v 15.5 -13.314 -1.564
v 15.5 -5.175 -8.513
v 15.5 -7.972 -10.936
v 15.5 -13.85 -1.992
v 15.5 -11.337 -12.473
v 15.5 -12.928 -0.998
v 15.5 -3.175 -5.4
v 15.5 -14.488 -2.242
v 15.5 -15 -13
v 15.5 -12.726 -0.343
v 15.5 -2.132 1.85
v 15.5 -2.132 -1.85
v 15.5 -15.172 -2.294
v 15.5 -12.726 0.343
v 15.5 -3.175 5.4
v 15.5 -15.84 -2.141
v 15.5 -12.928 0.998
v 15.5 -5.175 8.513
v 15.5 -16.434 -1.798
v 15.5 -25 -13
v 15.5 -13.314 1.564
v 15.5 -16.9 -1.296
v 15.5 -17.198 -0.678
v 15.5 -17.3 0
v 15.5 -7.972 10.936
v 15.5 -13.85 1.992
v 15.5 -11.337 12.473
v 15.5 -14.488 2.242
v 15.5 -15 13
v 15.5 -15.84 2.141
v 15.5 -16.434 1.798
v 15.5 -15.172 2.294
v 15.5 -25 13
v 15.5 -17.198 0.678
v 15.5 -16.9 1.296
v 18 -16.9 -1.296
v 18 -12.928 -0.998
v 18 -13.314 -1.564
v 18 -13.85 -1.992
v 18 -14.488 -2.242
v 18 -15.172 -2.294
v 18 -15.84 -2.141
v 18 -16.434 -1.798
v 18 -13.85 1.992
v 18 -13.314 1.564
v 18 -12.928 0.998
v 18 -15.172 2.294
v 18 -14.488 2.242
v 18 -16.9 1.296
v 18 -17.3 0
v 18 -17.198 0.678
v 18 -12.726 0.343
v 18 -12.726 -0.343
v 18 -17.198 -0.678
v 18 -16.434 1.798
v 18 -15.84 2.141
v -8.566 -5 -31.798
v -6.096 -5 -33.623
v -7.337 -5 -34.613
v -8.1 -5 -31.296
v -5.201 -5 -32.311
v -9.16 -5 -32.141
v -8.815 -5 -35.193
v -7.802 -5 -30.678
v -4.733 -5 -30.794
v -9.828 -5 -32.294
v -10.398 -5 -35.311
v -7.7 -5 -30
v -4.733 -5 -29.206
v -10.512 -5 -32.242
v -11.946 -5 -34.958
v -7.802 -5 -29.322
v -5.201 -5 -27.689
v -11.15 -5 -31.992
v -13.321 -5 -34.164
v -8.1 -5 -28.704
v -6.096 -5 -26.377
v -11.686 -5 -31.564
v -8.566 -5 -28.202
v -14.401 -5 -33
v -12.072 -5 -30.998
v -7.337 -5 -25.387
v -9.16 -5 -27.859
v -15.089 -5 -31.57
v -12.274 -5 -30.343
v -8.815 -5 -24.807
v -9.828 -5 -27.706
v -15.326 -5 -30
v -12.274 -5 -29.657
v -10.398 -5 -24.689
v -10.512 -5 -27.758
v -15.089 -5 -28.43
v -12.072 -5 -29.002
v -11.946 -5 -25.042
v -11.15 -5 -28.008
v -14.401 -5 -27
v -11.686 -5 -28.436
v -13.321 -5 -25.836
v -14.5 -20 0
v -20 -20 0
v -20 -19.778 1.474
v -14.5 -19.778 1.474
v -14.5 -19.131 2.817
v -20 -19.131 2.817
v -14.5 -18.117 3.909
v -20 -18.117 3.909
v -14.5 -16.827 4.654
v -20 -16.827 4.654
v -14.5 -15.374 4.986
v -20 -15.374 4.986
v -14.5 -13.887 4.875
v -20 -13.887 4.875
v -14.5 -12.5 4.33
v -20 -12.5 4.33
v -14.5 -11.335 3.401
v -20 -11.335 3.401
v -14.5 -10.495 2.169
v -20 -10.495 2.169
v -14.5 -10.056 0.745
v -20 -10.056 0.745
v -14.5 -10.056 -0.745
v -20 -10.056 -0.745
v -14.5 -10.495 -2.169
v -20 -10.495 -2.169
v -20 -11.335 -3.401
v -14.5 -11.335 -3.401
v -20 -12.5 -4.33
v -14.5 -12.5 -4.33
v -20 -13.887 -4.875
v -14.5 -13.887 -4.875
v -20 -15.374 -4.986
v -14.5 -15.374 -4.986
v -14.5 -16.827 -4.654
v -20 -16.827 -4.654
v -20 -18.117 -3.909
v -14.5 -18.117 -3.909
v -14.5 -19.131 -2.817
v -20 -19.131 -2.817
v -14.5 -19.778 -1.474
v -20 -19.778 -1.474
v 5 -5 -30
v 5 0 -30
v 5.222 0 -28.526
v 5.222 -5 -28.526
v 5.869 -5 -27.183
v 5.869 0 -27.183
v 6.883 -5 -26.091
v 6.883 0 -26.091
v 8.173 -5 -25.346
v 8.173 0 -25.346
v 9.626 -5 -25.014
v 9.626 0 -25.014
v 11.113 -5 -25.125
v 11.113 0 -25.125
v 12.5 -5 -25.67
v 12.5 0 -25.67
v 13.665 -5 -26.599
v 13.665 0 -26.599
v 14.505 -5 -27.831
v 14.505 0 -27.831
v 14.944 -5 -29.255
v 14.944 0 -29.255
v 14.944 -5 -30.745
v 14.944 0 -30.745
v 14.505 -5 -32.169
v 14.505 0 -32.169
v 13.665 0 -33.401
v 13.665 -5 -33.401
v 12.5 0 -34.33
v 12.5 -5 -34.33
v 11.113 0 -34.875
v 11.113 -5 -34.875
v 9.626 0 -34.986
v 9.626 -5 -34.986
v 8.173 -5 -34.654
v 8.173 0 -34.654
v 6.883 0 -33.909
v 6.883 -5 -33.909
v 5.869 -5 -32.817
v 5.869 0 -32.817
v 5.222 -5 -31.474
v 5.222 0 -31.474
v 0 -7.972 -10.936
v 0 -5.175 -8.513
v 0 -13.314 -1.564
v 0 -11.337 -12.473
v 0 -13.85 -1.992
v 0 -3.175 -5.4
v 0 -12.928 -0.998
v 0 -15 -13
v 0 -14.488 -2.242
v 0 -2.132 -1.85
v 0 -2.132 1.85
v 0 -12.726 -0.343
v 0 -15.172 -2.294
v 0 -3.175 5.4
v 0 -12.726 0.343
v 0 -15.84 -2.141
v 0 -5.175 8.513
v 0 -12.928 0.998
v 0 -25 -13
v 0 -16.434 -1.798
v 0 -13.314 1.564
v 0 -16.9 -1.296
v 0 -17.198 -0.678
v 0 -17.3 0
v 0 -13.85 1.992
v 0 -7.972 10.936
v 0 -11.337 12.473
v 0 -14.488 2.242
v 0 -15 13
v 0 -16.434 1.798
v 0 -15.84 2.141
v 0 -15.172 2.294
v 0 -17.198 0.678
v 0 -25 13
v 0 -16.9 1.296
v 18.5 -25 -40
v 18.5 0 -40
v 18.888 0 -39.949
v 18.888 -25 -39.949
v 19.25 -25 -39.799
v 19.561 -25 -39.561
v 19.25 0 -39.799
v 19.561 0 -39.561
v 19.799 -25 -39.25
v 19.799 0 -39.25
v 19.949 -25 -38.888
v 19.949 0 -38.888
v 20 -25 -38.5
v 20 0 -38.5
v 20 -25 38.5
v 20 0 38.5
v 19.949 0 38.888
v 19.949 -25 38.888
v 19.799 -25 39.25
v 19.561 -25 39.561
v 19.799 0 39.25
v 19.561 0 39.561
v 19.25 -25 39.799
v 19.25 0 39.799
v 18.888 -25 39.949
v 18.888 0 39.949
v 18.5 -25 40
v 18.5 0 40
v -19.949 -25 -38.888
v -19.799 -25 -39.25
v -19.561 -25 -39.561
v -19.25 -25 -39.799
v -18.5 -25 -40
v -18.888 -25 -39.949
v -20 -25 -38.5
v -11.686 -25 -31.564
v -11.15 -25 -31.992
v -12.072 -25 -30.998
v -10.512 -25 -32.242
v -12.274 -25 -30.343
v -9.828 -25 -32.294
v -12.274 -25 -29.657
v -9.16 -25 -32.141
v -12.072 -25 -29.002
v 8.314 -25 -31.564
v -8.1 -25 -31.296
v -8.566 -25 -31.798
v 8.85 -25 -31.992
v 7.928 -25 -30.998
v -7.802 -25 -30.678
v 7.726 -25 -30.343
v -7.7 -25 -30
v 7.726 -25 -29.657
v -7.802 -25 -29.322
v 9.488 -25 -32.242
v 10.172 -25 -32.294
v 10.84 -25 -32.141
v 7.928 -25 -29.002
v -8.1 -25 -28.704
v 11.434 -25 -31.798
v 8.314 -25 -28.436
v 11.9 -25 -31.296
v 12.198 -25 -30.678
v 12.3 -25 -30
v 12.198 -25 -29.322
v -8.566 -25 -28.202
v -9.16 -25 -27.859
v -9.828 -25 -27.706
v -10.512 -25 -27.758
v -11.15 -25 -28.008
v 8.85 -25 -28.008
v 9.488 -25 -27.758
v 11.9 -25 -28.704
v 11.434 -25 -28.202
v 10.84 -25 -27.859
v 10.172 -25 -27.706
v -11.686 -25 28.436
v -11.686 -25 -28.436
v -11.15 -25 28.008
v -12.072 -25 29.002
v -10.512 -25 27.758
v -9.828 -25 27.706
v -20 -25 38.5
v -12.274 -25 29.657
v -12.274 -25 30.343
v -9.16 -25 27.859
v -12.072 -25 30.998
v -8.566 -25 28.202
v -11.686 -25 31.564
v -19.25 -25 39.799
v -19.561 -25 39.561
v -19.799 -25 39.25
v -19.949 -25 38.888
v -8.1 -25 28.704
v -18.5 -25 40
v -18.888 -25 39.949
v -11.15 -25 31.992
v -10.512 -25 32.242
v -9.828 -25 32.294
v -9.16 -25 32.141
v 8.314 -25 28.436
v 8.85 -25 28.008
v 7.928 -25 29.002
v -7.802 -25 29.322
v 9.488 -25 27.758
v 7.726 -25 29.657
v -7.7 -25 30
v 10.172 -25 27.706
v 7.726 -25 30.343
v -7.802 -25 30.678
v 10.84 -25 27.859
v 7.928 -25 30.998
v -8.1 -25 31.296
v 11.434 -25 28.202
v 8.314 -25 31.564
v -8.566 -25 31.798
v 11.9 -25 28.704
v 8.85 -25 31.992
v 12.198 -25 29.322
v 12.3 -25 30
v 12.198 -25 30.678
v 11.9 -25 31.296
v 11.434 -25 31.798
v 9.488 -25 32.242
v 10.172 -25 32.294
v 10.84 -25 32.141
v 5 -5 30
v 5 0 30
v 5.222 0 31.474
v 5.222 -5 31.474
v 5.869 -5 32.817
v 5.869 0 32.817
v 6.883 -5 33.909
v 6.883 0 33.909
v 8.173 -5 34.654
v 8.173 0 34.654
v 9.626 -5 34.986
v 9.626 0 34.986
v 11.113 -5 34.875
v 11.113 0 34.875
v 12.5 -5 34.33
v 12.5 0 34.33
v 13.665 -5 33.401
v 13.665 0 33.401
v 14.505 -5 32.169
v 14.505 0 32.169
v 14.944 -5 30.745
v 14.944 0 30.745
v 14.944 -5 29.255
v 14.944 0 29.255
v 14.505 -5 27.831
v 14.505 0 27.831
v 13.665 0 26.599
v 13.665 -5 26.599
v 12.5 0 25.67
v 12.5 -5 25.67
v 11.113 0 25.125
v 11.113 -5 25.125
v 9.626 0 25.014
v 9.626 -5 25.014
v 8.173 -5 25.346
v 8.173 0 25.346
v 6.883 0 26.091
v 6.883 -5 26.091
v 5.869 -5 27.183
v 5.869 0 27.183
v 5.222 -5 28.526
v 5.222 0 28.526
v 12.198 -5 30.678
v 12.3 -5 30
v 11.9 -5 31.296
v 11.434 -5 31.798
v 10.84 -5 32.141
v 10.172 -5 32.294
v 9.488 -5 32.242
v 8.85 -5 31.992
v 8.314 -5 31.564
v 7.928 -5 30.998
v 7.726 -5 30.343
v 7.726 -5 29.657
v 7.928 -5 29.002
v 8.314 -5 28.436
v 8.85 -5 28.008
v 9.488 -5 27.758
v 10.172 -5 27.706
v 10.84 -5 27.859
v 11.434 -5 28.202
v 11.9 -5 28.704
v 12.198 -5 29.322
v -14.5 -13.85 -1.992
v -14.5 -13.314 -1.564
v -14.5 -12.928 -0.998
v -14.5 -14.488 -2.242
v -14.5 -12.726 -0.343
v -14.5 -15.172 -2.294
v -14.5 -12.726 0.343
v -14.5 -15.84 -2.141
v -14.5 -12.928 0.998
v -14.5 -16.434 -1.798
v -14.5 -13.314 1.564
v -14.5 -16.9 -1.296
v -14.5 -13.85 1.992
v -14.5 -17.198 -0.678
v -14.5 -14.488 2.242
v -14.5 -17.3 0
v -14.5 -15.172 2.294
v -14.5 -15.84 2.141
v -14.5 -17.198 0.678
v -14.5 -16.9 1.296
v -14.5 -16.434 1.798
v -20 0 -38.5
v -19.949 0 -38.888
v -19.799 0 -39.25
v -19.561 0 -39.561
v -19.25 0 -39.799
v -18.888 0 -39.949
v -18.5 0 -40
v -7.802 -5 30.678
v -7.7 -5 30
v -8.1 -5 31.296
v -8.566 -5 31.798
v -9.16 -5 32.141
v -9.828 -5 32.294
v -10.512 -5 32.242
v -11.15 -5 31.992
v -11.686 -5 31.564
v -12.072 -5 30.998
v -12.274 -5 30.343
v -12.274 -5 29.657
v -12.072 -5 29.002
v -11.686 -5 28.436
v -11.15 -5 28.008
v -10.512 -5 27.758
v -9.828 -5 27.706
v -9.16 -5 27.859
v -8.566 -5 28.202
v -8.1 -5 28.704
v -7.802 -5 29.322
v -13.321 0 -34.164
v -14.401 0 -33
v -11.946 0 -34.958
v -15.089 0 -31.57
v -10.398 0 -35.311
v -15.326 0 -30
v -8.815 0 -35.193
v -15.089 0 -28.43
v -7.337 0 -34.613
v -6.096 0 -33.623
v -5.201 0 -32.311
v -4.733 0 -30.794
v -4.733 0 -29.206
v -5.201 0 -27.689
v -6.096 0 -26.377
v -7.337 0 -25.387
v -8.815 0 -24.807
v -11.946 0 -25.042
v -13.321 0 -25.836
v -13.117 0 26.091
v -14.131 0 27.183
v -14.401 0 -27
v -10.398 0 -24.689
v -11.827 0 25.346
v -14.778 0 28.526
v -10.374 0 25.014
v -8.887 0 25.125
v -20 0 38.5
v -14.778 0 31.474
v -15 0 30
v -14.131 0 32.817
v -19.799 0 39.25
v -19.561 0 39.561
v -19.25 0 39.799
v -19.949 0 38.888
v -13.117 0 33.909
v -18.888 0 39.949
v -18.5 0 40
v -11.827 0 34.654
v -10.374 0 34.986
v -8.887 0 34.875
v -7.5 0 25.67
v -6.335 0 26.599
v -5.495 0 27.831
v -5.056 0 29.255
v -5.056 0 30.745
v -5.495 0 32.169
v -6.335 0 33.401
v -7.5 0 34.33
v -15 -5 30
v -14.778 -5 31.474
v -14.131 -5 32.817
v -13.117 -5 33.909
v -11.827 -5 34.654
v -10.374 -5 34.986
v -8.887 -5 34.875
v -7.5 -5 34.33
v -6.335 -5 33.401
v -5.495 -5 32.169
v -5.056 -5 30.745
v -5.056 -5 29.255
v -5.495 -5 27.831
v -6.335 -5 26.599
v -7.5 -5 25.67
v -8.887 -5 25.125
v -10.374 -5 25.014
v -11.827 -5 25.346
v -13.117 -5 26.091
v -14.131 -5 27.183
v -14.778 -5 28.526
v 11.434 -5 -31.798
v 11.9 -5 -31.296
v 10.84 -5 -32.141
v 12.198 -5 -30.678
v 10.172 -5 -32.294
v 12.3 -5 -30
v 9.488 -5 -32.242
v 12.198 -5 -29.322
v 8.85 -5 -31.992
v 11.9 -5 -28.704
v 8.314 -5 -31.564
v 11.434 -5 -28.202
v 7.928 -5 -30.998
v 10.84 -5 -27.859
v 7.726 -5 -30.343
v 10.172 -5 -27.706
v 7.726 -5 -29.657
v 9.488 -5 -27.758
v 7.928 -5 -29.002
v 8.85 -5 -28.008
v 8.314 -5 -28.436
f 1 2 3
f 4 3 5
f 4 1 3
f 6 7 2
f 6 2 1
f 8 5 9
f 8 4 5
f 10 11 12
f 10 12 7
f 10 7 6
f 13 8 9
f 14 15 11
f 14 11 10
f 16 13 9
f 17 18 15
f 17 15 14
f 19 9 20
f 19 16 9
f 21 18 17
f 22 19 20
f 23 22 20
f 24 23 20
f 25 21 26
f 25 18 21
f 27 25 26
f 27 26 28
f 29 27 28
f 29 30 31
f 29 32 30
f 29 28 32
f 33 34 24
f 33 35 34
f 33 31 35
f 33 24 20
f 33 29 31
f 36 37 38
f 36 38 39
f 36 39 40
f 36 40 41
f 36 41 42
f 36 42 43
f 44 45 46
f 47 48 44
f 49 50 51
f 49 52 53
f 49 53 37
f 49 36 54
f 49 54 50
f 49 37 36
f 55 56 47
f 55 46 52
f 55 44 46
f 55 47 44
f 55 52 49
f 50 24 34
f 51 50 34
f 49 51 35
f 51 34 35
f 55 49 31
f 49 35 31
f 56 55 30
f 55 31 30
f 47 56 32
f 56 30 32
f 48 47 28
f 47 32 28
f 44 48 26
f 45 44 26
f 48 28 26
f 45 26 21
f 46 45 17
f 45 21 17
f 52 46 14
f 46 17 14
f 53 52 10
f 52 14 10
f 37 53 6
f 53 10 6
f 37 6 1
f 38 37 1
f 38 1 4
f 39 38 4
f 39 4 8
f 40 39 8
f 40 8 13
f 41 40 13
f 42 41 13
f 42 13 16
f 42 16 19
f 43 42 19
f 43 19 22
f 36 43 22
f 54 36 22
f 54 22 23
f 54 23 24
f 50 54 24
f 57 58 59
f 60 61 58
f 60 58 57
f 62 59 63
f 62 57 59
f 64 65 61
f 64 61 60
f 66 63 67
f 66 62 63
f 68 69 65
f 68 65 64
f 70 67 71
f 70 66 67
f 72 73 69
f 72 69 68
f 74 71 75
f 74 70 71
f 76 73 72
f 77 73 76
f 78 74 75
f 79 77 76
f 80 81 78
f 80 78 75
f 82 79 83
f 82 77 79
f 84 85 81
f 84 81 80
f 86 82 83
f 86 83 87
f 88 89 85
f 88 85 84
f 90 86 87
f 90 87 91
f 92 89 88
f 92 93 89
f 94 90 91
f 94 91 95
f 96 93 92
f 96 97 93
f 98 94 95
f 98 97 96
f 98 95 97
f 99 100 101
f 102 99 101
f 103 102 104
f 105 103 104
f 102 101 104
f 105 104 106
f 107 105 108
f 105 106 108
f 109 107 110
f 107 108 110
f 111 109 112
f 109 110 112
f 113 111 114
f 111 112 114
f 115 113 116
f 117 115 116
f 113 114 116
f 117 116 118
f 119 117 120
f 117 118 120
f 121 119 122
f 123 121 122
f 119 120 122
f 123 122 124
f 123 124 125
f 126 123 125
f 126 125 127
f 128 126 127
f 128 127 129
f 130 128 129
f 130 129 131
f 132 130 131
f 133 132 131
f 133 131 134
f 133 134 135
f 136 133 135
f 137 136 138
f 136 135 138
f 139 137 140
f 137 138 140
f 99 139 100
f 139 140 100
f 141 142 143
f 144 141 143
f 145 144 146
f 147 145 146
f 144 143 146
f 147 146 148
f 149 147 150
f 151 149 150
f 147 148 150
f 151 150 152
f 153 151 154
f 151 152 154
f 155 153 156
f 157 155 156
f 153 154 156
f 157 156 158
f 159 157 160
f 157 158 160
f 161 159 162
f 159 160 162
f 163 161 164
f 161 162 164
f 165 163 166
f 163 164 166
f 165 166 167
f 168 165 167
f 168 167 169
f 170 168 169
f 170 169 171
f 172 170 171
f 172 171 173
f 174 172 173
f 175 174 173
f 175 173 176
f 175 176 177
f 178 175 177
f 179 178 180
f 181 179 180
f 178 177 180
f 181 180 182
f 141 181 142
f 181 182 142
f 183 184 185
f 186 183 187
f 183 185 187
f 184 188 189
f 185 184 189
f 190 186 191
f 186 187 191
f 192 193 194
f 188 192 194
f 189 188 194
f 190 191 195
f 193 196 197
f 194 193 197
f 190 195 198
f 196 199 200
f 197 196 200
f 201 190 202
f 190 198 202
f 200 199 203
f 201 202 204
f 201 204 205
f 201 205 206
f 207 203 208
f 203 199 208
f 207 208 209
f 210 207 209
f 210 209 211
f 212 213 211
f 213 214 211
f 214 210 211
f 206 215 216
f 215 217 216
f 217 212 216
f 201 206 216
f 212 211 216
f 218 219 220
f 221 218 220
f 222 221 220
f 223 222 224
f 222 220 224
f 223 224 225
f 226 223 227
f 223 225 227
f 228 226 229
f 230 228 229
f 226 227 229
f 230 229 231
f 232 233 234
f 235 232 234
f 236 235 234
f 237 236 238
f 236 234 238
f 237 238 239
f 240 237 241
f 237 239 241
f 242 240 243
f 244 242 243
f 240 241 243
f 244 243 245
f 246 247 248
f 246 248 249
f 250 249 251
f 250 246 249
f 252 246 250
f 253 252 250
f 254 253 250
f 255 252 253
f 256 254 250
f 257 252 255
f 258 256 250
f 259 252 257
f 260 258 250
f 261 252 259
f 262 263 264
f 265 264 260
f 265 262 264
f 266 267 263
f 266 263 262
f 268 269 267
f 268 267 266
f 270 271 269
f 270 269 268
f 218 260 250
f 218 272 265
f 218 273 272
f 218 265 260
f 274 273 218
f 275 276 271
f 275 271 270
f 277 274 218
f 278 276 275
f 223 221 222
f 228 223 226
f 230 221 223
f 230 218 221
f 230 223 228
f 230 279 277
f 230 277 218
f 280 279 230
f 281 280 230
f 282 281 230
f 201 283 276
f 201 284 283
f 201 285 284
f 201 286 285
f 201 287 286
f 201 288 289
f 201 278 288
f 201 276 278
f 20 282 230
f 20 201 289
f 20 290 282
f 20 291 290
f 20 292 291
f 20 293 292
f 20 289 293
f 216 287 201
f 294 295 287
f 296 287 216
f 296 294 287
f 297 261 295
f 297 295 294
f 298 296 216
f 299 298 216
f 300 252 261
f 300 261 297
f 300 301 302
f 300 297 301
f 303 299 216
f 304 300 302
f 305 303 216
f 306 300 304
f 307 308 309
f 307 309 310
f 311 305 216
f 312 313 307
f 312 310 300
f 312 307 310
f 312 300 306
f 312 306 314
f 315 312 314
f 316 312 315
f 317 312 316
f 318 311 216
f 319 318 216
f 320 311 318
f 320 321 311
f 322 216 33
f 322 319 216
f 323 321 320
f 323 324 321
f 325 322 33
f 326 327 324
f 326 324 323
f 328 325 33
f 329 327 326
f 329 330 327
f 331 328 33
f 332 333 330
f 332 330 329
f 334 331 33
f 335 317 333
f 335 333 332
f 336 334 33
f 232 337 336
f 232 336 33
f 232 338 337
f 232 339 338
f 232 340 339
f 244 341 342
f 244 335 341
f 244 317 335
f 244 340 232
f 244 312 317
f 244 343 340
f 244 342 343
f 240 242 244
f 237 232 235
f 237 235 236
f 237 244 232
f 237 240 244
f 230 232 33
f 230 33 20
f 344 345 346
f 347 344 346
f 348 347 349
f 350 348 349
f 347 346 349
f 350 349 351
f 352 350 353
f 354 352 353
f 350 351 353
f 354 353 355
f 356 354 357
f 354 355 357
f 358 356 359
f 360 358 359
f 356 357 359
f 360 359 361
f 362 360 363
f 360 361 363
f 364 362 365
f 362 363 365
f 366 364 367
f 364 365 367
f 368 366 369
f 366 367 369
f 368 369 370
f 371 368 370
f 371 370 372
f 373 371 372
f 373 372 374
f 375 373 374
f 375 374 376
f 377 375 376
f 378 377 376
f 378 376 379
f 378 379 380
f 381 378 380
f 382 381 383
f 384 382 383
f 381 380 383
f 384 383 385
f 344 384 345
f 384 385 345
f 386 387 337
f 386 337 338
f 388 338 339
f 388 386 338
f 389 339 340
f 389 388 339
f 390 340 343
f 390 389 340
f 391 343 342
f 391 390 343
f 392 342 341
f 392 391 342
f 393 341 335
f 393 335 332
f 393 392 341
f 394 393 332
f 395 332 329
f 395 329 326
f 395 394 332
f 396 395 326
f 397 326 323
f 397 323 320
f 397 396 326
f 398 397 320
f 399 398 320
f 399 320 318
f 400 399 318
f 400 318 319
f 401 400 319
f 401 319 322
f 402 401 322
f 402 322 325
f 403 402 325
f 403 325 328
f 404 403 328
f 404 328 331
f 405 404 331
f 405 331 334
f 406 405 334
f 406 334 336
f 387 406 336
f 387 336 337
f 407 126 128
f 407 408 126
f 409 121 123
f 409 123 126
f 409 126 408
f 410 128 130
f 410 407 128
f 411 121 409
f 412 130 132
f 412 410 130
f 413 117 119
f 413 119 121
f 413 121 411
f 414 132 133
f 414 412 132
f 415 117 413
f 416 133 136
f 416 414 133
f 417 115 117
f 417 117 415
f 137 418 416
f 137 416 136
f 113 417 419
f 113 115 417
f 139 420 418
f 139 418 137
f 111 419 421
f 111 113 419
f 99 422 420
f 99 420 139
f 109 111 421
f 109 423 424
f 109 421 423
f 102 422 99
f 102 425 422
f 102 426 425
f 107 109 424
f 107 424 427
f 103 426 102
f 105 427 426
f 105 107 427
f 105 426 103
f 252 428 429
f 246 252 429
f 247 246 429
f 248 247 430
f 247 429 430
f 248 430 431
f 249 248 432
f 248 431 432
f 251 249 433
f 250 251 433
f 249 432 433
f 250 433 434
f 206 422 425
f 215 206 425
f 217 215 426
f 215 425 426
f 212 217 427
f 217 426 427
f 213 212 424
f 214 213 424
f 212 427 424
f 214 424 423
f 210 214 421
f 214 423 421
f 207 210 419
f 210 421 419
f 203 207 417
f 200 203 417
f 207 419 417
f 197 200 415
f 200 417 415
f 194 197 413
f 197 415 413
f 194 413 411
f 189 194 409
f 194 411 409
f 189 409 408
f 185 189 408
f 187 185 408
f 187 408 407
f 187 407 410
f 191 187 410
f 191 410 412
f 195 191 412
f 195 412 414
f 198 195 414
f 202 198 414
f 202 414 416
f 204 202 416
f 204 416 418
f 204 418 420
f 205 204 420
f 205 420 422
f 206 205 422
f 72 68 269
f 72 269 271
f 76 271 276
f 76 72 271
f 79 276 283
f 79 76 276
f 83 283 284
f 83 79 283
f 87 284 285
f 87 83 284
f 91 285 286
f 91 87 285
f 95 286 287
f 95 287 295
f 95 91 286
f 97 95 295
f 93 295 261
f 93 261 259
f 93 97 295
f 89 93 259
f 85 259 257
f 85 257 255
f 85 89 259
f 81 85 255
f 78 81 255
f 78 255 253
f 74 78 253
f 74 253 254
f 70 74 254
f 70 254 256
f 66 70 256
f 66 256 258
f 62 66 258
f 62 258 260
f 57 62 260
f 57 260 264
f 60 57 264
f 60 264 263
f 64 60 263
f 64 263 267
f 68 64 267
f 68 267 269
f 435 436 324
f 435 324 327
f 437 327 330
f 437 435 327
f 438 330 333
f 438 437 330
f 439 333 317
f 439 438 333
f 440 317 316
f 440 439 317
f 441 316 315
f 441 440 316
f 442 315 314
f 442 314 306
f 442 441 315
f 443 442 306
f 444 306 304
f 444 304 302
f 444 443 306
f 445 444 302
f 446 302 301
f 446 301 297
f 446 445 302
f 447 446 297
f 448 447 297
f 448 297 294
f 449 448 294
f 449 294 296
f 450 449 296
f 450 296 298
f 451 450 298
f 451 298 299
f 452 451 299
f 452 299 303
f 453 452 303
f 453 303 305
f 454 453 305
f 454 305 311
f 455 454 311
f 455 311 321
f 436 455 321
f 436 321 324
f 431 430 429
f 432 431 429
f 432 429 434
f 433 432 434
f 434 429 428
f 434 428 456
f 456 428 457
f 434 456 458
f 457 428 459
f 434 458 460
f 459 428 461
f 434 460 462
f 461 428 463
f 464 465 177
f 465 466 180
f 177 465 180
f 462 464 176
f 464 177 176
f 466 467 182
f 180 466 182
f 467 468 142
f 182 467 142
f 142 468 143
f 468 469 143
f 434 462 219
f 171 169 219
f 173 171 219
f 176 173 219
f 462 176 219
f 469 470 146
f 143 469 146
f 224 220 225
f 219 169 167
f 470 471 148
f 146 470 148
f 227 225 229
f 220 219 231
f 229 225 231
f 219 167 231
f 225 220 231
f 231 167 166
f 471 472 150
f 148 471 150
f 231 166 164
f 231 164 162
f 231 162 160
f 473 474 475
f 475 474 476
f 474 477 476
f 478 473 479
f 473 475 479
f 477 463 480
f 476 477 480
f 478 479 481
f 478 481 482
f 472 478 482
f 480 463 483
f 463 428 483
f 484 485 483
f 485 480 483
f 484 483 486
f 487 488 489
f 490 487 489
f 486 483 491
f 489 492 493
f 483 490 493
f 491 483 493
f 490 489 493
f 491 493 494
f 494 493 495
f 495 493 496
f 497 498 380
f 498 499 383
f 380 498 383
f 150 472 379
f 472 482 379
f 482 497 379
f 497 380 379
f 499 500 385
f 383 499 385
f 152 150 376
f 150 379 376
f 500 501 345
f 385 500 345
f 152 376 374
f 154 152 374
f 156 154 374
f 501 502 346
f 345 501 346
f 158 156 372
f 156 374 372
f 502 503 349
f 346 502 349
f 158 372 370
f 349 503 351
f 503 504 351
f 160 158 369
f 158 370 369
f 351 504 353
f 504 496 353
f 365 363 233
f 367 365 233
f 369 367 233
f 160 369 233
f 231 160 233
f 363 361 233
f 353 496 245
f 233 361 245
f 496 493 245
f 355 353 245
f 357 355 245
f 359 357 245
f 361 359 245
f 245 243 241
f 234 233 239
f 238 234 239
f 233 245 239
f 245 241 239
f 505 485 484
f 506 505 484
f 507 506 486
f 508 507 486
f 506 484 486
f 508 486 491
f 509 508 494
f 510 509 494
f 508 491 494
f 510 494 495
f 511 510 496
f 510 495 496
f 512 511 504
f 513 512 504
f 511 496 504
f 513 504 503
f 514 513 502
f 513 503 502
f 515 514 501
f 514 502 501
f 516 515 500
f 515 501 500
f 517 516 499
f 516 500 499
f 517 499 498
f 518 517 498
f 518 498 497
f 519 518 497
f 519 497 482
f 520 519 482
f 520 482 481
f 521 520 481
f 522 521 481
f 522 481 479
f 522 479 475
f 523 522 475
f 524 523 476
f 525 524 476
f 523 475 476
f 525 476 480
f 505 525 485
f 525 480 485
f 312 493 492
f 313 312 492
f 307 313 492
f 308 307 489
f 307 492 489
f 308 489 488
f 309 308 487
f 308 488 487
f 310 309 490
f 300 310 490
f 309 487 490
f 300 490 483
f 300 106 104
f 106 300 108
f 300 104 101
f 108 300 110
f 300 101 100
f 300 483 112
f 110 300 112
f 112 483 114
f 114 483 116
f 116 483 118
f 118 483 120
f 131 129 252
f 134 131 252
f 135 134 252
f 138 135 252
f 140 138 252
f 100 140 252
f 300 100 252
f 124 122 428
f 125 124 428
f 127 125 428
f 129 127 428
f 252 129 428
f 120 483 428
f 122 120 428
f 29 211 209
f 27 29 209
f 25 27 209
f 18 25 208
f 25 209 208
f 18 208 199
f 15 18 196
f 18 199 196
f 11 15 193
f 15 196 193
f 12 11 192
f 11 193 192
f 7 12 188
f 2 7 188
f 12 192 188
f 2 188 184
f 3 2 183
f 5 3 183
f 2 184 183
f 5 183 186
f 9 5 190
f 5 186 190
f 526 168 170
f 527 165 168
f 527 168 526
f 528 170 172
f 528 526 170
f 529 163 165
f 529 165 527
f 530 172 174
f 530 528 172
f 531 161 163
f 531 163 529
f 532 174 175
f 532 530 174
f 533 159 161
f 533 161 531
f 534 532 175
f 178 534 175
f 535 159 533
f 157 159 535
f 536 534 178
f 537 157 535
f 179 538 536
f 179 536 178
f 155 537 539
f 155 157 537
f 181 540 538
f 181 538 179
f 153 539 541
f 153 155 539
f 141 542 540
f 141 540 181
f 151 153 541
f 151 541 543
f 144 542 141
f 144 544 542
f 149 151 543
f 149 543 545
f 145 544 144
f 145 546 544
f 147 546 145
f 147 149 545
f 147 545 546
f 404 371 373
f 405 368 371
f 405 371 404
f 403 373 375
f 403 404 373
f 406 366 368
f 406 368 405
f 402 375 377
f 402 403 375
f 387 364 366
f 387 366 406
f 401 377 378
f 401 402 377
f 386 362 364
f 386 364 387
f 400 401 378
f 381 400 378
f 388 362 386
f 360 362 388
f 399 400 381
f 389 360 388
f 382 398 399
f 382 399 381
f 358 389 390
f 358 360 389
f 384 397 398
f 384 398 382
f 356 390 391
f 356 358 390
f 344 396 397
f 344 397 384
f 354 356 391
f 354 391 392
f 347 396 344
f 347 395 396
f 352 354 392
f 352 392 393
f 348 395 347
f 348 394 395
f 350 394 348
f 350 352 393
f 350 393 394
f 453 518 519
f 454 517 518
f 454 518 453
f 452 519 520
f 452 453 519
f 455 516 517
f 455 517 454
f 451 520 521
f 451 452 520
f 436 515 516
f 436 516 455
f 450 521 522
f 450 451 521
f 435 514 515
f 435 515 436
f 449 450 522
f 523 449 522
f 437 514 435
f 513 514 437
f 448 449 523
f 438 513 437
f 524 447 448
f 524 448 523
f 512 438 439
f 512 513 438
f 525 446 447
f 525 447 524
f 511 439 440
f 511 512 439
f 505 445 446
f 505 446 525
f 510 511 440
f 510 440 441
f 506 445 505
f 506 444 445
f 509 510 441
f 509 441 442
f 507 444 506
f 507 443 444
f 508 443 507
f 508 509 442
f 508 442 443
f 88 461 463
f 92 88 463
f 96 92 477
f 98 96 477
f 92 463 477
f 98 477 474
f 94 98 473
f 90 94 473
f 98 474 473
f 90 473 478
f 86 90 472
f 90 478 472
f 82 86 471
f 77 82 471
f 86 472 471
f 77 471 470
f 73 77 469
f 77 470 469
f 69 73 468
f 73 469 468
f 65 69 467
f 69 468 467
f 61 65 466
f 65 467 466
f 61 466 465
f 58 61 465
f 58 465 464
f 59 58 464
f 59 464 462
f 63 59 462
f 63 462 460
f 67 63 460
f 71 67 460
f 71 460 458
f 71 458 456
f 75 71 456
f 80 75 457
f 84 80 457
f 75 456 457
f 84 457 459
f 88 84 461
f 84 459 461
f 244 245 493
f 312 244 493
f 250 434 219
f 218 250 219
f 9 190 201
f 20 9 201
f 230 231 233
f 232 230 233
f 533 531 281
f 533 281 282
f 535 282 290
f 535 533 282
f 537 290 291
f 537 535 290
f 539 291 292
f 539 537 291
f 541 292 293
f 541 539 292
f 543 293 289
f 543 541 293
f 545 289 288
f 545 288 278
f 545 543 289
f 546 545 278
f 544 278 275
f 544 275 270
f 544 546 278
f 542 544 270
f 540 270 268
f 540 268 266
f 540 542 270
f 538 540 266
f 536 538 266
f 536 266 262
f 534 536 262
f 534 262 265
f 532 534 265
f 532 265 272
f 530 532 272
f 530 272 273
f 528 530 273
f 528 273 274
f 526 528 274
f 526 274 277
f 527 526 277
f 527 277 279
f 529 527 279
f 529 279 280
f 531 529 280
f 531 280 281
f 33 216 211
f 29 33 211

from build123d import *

# Parameters (mm, degrees)
F0_R      = 2.3
F1_DEPTH  = 25
F2_R      = 5
F2_R_2    = 5.3261161738
F3_DEPTH  = 5
F7_DEPTH  = 15.5
F9_R      = 2.3
F10_DEPTH = 38
F11_R     = 5
F12_DEPTH = 5.5


with BuildPart() as f1:
    # F0 (on Front) → F1 (new body)
    with BuildSketch(Plane.XZ):
        with BuildLine():
            ThreePointArc((18.5, -40), (19.5606601718, -39.5606601718), (20, -38.5))
            Line((20, -38.5), (20, 38.5))
            ThreePointArc((20, 38.5), (19.5606601718, 39.5606601718), (18.5, 40))
            Line((18.5, 40), (-18.5, 40))
            ThreePointArc((-18.5, 40), (-19.5606601718, 39.5606601718), (-20, 38.5))
            Line((-20, 38.5), (-20, -38.5))
            ThreePointArc((-20, -38.5), (-19.5606601718, -39.5606601718), (-18.5, -40))
            Line((-18.5, -40), (18.5, -40))
        make_face()
        with Locations((-10, -30)):
            Circle(F0_R, mode=Mode.SUBTRACT)
        with Locations((10, -30)):
            Circle(F0_R, mode=Mode.SUBTRACT)
        with Locations((-10, 30)):
            Circle(F0_R, mode=Mode.SUBTRACT)
        with Locations((10, 30)):
            Circle(F0_R, mode=Mode.SUBTRACT)
    extrude(amount=F1_DEPTH)

    # F2 (on face) → F3 (cut)
    with BuildSketch(Plane(origin=(0, 0, 0), x_dir=(-1, 0, 0), z_dir=(0, 1, 0))):
        with Locations((-10, 30)):
            Circle(F2_R)
        with Locations((10, 30)):
            Circle(F2_R)
        with Locations((10, -30)):
            Circle(F2_R_2)
        with Locations((-10, -30)):
            Circle(F2_R)
    extrude(amount=-F3_DEPTH, mode=Mode.SUBTRACT)

    # F6 (on offset) → F7 (cut, through all)
    with BuildSketch(Plane(origin=(0, 0, 0), x_dir=(0, -1, 0), z_dir=(-1, 0, 0))):
        with BuildLine():
            Line((15, -13), (25, -13))
            Line((25, -13), (25, 13))
            Line((25, 13), (15, 13))
            ThreePointArc((15, 13), (2, 0), (15, -13))
        make_face()
    extrude(amount=-F7_DEPTH, mode=Mode.SUBTRACT)

    # F9 (on face) → F10 (cut, through all)
    with BuildSketch(Plane(origin=(-20, 0, 0), x_dir=(0, -1, 0), z_dir=(-1, 0, 0))):
        with Locations((15, 0)):
            Circle(F9_R)
    extrude(amount=-F10_DEPTH, mode=Mode.SUBTRACT)

    # F11 (on face) → F12 (cut)
    with BuildSketch(Plane(origin=(-20, 0, 0), x_dir=(0, -1, 0), z_dir=(-1, 0, 0))):
        with Locations((15, 0)):
            Circle(F11_R)
    extrude(amount=-F12_DEPTH, mode=Mode.SUBTRACT)


solid = f1.part
